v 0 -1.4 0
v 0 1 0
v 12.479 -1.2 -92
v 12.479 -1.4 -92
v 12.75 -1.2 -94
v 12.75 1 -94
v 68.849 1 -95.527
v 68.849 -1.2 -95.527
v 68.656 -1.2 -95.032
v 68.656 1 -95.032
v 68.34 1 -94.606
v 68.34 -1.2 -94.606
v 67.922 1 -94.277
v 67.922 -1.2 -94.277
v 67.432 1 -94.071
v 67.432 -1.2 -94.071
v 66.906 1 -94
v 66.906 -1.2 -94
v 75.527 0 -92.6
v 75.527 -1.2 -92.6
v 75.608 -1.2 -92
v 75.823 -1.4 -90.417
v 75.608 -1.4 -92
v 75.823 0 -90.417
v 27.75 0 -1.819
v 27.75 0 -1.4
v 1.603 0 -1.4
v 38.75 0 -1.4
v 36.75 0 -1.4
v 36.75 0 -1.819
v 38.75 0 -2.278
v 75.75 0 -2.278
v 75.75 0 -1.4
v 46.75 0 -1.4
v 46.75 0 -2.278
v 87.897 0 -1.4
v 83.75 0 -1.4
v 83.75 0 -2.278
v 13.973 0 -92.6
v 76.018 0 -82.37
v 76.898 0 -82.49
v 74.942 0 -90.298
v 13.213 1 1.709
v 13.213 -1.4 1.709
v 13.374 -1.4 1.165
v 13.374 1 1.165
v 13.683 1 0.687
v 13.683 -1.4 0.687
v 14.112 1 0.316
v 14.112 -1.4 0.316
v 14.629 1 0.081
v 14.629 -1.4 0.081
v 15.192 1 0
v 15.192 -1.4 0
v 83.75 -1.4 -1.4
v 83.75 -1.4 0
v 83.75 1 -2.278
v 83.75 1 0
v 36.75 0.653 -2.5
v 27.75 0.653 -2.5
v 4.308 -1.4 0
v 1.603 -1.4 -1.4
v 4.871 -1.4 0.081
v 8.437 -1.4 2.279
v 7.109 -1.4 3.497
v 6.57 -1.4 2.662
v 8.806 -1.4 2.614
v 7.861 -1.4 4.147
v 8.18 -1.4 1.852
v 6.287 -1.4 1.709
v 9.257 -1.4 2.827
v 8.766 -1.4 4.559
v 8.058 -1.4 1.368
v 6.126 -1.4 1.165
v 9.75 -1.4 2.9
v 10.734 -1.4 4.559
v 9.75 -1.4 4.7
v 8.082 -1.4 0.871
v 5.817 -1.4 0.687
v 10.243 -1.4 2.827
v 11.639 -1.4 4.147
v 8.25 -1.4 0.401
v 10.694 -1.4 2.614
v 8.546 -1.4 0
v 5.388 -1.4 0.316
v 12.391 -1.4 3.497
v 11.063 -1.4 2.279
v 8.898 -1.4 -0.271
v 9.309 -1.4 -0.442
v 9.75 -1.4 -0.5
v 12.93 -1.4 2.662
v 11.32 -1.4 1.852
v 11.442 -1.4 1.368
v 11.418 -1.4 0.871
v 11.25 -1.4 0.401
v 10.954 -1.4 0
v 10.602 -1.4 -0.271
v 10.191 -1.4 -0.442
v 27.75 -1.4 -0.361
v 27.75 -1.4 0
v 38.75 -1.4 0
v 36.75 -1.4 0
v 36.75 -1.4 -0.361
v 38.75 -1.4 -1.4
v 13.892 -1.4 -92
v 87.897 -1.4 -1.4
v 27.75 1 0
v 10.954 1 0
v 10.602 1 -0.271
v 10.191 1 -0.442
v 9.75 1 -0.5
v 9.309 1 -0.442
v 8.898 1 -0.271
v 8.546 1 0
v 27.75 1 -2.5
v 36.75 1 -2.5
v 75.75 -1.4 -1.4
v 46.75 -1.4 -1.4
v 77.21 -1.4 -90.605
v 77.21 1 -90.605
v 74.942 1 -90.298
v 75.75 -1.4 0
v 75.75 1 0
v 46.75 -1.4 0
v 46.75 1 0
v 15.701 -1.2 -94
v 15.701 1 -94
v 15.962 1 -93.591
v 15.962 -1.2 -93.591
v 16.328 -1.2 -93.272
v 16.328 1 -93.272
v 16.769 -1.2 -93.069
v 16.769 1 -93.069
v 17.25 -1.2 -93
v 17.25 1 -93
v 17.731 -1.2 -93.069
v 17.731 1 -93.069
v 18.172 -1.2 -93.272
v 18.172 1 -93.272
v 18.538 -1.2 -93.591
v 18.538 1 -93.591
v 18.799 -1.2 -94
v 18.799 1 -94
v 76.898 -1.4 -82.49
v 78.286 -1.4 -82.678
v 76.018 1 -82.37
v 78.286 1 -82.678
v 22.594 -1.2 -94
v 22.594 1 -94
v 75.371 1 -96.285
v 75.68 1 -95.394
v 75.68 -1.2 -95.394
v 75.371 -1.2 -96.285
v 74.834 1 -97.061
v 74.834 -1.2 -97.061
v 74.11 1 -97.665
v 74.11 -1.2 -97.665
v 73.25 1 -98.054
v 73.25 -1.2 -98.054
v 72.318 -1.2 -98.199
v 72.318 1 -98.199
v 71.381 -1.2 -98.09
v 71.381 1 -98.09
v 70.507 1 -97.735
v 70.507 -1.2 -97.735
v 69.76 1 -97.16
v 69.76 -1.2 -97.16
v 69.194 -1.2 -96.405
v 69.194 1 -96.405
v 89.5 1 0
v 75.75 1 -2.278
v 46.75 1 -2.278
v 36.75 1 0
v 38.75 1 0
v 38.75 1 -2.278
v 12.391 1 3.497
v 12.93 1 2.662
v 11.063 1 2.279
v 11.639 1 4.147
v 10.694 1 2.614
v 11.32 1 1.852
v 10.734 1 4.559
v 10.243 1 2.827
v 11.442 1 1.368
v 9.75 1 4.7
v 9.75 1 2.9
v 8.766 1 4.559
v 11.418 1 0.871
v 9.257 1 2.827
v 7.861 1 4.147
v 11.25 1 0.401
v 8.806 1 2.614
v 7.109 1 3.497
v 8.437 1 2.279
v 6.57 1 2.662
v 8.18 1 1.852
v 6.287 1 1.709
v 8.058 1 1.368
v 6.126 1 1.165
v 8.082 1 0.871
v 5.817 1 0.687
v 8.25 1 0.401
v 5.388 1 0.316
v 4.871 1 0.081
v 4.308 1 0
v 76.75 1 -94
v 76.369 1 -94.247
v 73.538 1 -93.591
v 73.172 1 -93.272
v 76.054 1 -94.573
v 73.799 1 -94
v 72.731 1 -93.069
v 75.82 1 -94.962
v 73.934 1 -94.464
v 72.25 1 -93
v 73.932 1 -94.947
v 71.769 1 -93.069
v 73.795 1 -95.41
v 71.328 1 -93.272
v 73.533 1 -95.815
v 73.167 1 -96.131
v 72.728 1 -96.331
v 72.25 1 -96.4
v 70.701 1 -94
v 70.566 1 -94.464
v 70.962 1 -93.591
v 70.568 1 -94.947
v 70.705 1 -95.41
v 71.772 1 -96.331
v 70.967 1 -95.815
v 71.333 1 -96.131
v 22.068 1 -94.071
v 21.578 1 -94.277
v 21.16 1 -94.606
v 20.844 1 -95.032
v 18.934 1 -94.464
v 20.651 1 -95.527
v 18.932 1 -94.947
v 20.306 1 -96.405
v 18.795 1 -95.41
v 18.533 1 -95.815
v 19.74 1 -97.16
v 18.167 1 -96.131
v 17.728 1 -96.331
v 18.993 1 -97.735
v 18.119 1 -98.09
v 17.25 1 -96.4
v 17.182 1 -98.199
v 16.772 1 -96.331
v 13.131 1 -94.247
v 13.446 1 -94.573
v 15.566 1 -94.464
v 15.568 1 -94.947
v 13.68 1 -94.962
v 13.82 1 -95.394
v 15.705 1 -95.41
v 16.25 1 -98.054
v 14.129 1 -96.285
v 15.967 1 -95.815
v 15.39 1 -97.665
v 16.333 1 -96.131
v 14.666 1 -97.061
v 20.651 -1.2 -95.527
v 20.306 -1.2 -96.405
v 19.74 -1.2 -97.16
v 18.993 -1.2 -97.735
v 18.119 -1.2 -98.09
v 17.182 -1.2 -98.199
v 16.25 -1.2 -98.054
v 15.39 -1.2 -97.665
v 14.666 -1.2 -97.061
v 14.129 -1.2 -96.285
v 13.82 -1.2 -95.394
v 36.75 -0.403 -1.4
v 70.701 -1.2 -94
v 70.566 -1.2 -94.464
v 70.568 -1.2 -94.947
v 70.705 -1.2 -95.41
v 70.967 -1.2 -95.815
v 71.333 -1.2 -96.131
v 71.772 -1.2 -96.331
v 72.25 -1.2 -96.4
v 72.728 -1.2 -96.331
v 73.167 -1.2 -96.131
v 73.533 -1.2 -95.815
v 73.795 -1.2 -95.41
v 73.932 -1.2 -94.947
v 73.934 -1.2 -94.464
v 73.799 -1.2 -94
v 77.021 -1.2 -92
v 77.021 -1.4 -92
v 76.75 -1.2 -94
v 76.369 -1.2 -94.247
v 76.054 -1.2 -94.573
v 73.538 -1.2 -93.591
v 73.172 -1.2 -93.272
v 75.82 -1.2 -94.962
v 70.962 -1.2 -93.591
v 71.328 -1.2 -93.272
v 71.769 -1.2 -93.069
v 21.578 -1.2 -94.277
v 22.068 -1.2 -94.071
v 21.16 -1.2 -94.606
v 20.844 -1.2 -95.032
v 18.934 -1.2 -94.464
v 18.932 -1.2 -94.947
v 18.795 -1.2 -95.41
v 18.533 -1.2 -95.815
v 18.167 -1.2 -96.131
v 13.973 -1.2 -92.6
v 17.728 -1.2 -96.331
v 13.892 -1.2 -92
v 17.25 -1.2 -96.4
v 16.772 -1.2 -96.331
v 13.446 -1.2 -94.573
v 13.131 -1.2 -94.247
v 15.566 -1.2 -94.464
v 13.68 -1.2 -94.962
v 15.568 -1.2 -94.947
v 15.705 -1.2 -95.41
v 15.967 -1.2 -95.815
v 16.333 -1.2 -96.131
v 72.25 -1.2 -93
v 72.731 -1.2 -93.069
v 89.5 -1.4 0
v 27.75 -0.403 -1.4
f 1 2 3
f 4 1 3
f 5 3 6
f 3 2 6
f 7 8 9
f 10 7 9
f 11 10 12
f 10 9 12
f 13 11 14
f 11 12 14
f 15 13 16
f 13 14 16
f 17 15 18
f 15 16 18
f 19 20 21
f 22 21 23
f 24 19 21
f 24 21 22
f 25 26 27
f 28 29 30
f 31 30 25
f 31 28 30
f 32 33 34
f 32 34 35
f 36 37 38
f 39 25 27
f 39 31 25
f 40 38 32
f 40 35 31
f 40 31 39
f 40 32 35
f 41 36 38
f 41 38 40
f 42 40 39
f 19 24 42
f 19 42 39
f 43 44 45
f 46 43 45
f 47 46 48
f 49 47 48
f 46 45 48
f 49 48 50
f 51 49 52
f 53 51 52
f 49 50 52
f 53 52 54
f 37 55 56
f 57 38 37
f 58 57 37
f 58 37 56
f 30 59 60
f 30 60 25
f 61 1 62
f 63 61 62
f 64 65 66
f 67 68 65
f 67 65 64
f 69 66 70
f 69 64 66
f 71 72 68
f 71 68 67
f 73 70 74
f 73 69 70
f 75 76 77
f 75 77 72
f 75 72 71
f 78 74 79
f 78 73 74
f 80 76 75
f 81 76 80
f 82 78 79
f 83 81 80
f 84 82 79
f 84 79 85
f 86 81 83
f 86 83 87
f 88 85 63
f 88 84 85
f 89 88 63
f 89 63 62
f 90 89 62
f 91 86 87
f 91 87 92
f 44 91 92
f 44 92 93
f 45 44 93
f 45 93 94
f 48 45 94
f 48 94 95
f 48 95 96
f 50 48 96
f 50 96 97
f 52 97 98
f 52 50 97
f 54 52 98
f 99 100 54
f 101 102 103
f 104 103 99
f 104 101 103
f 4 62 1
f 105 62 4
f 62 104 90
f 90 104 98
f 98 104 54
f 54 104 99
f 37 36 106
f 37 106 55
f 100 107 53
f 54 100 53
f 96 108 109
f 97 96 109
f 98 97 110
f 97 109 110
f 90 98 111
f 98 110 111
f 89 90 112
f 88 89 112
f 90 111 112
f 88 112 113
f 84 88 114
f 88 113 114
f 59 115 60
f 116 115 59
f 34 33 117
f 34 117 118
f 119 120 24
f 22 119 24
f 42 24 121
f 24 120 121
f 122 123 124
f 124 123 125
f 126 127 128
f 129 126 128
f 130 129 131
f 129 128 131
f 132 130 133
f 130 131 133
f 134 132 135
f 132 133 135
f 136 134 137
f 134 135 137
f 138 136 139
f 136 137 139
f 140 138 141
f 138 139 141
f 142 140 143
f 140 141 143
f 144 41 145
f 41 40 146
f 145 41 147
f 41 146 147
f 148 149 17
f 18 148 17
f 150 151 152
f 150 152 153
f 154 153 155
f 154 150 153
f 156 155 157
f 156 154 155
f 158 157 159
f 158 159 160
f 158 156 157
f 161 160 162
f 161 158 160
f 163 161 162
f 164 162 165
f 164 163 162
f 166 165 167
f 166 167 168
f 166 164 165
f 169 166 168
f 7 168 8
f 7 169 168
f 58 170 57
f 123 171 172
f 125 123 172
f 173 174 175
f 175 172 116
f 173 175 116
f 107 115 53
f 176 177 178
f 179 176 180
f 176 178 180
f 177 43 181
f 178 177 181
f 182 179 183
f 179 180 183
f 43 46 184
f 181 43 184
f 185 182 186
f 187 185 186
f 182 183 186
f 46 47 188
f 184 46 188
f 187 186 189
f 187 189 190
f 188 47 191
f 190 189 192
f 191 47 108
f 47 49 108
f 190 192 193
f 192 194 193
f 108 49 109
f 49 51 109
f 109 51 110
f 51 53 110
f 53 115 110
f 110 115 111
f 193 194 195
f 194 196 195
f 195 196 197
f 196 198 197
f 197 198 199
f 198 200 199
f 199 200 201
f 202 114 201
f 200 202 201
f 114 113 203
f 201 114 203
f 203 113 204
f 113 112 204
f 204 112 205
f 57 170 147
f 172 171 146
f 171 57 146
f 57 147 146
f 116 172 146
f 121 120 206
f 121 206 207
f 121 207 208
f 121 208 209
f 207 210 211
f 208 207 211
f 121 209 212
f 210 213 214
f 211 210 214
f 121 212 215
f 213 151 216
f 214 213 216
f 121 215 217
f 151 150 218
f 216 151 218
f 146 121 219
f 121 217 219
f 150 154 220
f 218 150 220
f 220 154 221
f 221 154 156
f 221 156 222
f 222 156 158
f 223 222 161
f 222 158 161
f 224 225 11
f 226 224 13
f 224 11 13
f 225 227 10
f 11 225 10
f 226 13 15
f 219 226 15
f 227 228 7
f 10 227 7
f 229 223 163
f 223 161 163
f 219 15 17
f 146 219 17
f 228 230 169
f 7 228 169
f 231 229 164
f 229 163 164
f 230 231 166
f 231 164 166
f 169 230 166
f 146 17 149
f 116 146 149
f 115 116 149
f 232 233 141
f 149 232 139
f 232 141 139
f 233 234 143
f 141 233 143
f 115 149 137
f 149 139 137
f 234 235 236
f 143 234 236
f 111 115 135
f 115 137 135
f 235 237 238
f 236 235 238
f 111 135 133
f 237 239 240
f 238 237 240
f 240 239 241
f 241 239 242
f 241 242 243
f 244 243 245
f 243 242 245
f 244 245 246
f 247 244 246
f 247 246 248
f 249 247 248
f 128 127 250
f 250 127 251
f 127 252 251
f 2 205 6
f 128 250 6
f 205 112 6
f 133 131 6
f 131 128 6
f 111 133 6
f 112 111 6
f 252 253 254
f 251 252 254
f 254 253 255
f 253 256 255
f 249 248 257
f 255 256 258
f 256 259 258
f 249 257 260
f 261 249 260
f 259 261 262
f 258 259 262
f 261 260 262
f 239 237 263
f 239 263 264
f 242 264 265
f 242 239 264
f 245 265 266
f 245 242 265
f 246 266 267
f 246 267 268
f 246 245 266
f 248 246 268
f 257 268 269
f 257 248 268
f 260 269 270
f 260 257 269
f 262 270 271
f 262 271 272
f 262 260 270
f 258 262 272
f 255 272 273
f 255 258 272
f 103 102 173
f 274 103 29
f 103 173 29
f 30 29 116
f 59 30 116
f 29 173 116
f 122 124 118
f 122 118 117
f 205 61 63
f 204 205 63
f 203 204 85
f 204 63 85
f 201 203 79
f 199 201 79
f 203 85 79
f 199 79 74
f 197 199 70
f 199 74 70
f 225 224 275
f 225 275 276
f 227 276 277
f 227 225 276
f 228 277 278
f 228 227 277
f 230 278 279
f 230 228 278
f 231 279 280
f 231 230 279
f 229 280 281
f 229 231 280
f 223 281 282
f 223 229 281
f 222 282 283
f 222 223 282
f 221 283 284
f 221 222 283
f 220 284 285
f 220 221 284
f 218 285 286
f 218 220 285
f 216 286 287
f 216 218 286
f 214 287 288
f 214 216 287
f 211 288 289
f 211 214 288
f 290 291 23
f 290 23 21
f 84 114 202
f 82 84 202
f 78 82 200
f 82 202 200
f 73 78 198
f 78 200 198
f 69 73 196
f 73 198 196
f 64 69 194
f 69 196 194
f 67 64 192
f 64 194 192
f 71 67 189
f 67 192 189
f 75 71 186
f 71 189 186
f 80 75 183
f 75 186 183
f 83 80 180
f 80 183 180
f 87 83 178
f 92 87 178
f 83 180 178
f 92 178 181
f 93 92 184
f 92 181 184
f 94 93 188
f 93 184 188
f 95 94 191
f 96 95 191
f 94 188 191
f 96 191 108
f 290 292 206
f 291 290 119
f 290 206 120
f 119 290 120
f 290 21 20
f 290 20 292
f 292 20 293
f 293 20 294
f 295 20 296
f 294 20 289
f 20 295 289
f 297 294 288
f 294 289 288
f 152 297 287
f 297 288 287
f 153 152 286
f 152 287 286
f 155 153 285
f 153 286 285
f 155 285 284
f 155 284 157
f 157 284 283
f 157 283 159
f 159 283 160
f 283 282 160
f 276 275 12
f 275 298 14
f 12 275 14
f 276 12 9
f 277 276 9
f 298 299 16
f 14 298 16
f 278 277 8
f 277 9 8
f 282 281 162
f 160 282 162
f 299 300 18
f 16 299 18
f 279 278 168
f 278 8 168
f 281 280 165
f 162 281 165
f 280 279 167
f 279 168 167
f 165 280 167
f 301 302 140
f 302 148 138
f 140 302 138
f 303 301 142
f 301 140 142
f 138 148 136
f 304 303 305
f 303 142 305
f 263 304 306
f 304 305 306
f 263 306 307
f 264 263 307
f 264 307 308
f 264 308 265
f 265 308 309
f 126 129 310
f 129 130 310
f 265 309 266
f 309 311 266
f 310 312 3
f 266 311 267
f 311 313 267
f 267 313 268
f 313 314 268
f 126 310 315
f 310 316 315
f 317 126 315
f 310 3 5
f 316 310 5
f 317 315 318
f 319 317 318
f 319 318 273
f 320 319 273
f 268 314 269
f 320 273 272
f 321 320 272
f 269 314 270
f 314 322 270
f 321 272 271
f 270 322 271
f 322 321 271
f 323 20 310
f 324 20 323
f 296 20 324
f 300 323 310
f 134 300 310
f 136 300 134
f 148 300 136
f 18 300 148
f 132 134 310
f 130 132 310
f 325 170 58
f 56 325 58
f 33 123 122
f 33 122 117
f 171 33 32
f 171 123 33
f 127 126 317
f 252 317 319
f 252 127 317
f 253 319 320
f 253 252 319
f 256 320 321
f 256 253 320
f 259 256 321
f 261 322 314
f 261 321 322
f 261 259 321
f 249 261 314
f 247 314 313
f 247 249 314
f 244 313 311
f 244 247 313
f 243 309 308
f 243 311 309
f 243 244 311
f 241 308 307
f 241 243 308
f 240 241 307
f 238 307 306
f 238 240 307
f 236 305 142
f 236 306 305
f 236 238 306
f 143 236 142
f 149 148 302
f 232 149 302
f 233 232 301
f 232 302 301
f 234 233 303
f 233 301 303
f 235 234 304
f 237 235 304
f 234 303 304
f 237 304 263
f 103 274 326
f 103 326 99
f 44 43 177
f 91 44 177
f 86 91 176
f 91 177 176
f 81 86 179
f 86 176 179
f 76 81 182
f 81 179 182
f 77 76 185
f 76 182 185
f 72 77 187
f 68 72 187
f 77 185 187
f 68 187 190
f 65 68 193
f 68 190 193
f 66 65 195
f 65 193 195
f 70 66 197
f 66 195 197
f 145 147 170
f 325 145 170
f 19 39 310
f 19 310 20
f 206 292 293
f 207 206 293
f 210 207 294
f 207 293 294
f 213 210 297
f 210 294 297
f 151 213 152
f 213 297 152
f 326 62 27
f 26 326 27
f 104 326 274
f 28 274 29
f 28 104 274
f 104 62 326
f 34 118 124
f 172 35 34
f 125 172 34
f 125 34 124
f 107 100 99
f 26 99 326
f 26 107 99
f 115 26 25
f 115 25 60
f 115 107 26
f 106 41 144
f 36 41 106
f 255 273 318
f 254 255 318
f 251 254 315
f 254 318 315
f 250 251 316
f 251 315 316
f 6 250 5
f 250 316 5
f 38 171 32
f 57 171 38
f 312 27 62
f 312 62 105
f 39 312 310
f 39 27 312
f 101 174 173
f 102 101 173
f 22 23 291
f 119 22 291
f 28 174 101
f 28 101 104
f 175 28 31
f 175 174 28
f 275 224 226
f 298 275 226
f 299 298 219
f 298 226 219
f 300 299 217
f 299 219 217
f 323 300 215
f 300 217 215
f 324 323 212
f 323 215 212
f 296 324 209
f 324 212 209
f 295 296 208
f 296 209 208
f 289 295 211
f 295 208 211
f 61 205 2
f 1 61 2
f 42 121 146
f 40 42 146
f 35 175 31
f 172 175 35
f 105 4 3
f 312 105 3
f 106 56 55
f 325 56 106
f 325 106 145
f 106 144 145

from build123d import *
from build123d.topology import SkipClean

# Parameters (mm, degrees)
EXTRUDE_1_DEPTH     = 1
EXTRUDE_2_DEPTH     = 1.4
EXTRUDE_3_DEPTH     = 2.4
CUT_EXTRUDE_2_REACH = 134.888
SKETCH_4_R          = 1.7
CUT_EXTRUDE_3_DEPTH = 10
CUT_EXTRUDE_4_REACH = 134.874
SKETCH_6_W          = 6.2
SKETCH_6_H          = 0.2
FILLET_START        = -1.2
FILLET_1_DEPTH      = 2.2
FILLET_START_2      = -1.4
FILLET_1_2_DEPTH    = 0.226512
SKETCH_7_W          = 9
SKETCH_7_H          = 2.5
CUT_EXTRUDE_5_DEPTH = 133.88811083
EXTRUDE_4_REACH     = 113.48


with BuildPart() as part:
    # 草图1 → 凸台-拉伸1 (new body)
    with BuildSketch(Plane(origin=(0, 0, 0), x_dir=(1, 0, 0), z_dir=(0, 1, 0))):
        Polygon((0, 0), (12.75, 94), (76.75, 94), (89.5, 0), align=None)
    extrude(amount=EXTRUDE_1_DEPTH)

    # 草图2 → 凸台-拉伸2 (add)
    with BuildSketch(Plane.XZ):
        Polygon((89.5, 0), (0, 0), (12.75, -94), (76.75, -94), align=None)
        Polygon((87.897286654, -1.4), (1.602713346, -1.4), (13.972926112, -92.6), (75.527073888, -92.6), align=None, mode=Mode.SUBTRACT)
    extrude(amount=EXTRUDE_2_DEPTH)

    # 草图3 → 凸台-拉伸3 (add)
    with BuildSketch(Plane(origin=(0, 1, 0), x_dir=(1, 0, 0), z_dir=(0, 1, 0))):
        with BuildLine():
            Line((6.25, -1.2), (6.25, 0))
            Line((6.25, 0), (8.545840542, 0))
            ThreePointArc((8.545840542, 0), (9.75, -2.9), (10.954159458, 0))
            Line((10.954159458, 0), (13.25, 0))
            Line((13.25, 0), (13.25, -1.2))
            ThreePointArc((13.25, -1.2), (9.75, -4.7), (6.25, -1.2))
        make_face()
        with BuildLine():
            Line((13.75, 94.7), (13.75, 94))
            Line((13.75, 94), (13.82071436, 94))
            Line((13.82071436, 94), (15.700806662, 94))
            ThreePointArc((15.700806662, 94), (17.25, 96.4), (18.799193338, 94))
            Line((18.799193338, 94), (20.75, 94))
            Line((20.75, 94), (20.75, 94.7))
            ThreePointArc((20.75, 94.7), (17.25, 98.2), (13.75, 94.7))
        make_face()
        with BuildLine():
            Line((68.75, 94.7), (68.75, 94))
            Line((68.75, 94), (70.700806662, 94))
            ThreePointArc((70.700806662, 94), (72.25, 96.4), (73.799193338, 94))
            Line((73.799193338, 94), (75.75, 94))
            Line((75.75, 94), (75.75, 94.7))
            ThreePointArc((75.75, 94.7), (72.25, 98.2), (68.75, 94.7))
        make_face()
    extrude(amount=-EXTRUDE_3_DEPTH)

    # 草图4 → 切除-拉伸2 (cut, up to next)
    with BuildSketch(Plane(origin=(0, 1, 0), x_dir=(1, 0, 0), z_dir=(0, 1, 0)), mode=Mode.PRIVATE) as cut_extrude_2_sk1:
        with Locations(Location((9.75, -1.2, 0), (0, 0, 270))):
            Circle(SKETCH_4_R)
    cut_extrude_2_tool1 = extrude(cut_extrude_2_sk1.sketch, amount=-CUT_EXTRUDE_2_REACH, mode=Mode.PRIVATE) & part.part
    # 草图4 → 切除-拉伸2 (cut, up to next)
    with BuildSketch(Plane(origin=(0, 1, 0), x_dir=(1, 0, 0), z_dir=(0, 1, 0)), mode=Mode.PRIVATE) as cut_extrude_2_sk2:
        with Locations(Location((17.25, 94.7, 0), (0, 0, 270))):
            Circle(SKETCH_4_R)
    cut_extrude_2_tool2 = extrude(cut_extrude_2_sk2.sketch, amount=-CUT_EXTRUDE_2_REACH, mode=Mode.PRIVATE) & part.part
    # 草图4 → 切除-拉伸2 (cut, up to next)
    with BuildSketch(Plane(origin=(0, 1, 0), x_dir=(1, 0, 0), z_dir=(0, 1, 0)), mode=Mode.PRIVATE) as cut_extrude_2_sk3:
        with Locations(Location((72.25, 94.7, 0), (0, 0, 270))):
            Circle(SKETCH_4_R)
    cut_extrude_2_tool3 = extrude(cut_extrude_2_sk3.sketch, amount=-CUT_EXTRUDE_2_REACH, mode=Mode.PRIVATE) & part.part
    add(cut_extrude_2_tool1.solids().sort_by_distance((9.75, 1, 1.2))[0], mode=Mode.SUBTRACT)
    add(cut_extrude_2_tool2.solids().sort_by_distance((17.25, 1, -94.7))[0], mode=Mode.SUBTRACT)
    add(cut_extrude_2_tool3.solids().sort_by_distance((72.25, 1, -94.7))[0], mode=Mode.SUBTRACT)

    # 草图5 → 切除-拉伸3 (cut)
    with SkipClean():  # the faces are left unmerged after this step: merging them gives an invalid solid
        with BuildSketch(Plane(origin=(0, 1, 0), x_dir=(1, 0, 0), z_dir=(0, 1, 0))):
            with BuildLine():
                Line((78.21236986, 90.741242548), (74.942313599, 90.297697683))
                Line((74.942313599, 90.297697683), (76.017573878, 82.370288564))
                Line((76.017573878, 82.370288564), (79.28763014, 82.81383343))
                ThreePointArc((79.28763014, 82.81383343), (82.713704559, 87.315168128), (78.21236986, 90.741242548))
            make_face()
            with BuildLine():
                Line((38.75, -1.222462011), (38.75, 2.277537989))
                Line((38.75, 2.277537989), (46.75, 2.277537989))
                Line((46.75, 2.277537989), (46.75, -1.222462011))
                ThreePointArc((46.75, -1.222462011), (42.75, -5.222462011), (38.75, -1.222462011))
            make_face()
            with BuildLine():
                Line((75.75, -1.222462011), (75.75, 2.277537989))
                Line((75.75, 2.277537989), (83.75, 2.277537989))
                Line((83.75, 2.277537989), (83.75, -1.222462011))
                ThreePointArc((83.75, -1.222462011), (79.75, -5.222462011), (75.75, -1.222462011))
            make_face()
        extrude(amount=-CUT_EXTRUDE_3_DEPTH, mode=Mode.SUBTRACT)

    # 草图6 → 切除-拉伸4 (cut, up to next)
    with BuildSketch(Plane(origin=(0, 0, 0), x_dir=(0, 0, -1), z_dir=(1, 0, 0)), mode=Mode.PRIVATE) as cut_extrude_4_sk1:
        with Locations((95.1, -1.3)):
            Rectangle(SKETCH_6_W, SKETCH_6_H)
    cut_extrude_4_tool1 = extrude(cut_extrude_4_sk1.sketch, amount=CUT_EXTRUDE_4_REACH, mode=Mode.PRIVATE) & part.part
    add(cut_extrude_4_tool1.solids().sort_by_distance((0, -1.3, -95.1))[0], mode=Mode.SUBTRACT)

    # 圆角1: read off the stored shape, not the designer's step
    # 圆角1 outline → 圆角1 (add)
    with SkipClean():  # the faces are left unmerged after this step: merging them gives an invalid solid
        with BuildSketch(Plane(origin=(0, 0, 0), x_dir=(1, 0, 0), z_dir=(0, 1, 0)).offset(FILLET_START)):
            with BuildLine():
                ThreePointArc((13.25, -1.2), (13.240681915, -1.455224942), (13.212777274, -1.709090909))
                ThreePointArc((13.212777274, -1.709090909), (13.884185107, -0.486425063), (15.191507144, 0))
                Line((15.191507144, 0), (13.25, 0))
                Line((13.25, 0), (13.25, -1.2))
            make_face()
            with BuildLine():
                ThreePointArc((4.308492856, 0), (5.615814893, -0.486425063), (6.287222726, -1.709090909))
                ThreePointArc((6.287222726, -1.709090909), (6.259318085, -1.455224942), (6.25, -1.2))
                Line((6.25, -1.2), (6.25, 0))
                Line((6.25, 0), (4.308492856, 0))
            make_face()
            with BuildLine():
                Line((75.75, 94), (76.75, 94))
                ThreePointArc((76.75, 94), (76.053957158, 94.573295448), (75.680491288, 95.394067374))
                ThreePointArc((75.680491288, 95.394067374), (75.732579469, 95.048769616), (75.75, 94.7))
                Line((75.75, 94.7), (75.75, 94))
            make_face()
            with BuildLine():
                ThreePointArc((13.75, 94.7), (13.767420531, 95.048769616), (13.819508712, 95.394067374))
                ThreePointArc((13.819508712, 95.394067374), (13.446042842, 94.573295448), (12.75, 94))
                Line((12.75, 94), (13.75, 94))
                Line((13.75, 94), (13.75, 94.7))
            make_face()
            with BuildLine():
                Line((20.75, 94), (22.594155686, 94))
                ThreePointArc((22.594155686, 94), (21.358326925, 94.427509214), (20.650826346, 95.527272727))
                ThreePointArc((20.650826346, 95.527272727), (20.725118143, 95.116598001), (20.75, 94.7))
                Line((20.75, 94.7), (20.75, 94))
            make_face()
            with BuildLine():
                ThreePointArc((68.75, 94.7), (68.774881857, 95.116598001), (68.849173654, 95.527272727))
                ThreePointArc((68.849173654, 95.527272727), (68.141673075, 94.427509214), (66.905844314, 94))
                Line((66.905844314, 94), (68.75, 94))
                Line((68.75, 94), (68.75, 94.7))
            make_face()
        extrude(amount=FILLET_1_DEPTH)

    # Fillet 1 2 outline → Fillet 1 2 (add)
    with SkipClean():  # the faces are left unmerged after this step: merging them gives an invalid solid
        with BuildSketch(Plane(origin=(0, 0, 0), x_dir=(1, 0, 0), z_dir=(0, 1, 0)).offset(FILLET_START_2)):
            with BuildLine():
                ThreePointArc((13.25, -1.2), (13.240681915, -1.455224942), (13.212777274, -1.709090909))
                ThreePointArc((13.212777274, -1.709090909), (13.884185107, -0.486425063), (15.191507144, 0))
                Line((15.191507144, 0), (13.25, 0))
                Line((13.25, 0), (13.25, -1.2))
            make_face()
            with BuildLine():
                ThreePointArc((4.308492856, 0), (5.615814893, -0.486425063), (6.287222726, -1.709090909))
                ThreePointArc((6.287222726, -1.709090909), (6.259318085, -1.455224942), (6.25, -1.2))
                Line((6.25, -1.2), (6.25, 0))
                Line((6.25, 0), (4.308492856, 0))
            make_face()
        extrude(amount=FILLET_1_2_DEPTH)

    # 草图7 → 切除-拉伸5 (cut, through all)
    with SkipClean():  # the faces are left unmerged after this step: merging them gives an invalid solid
        with BuildSketch(Plane(origin=(0, 1, 0), x_dir=(1, 0, 0), z_dir=(0, 1, 0))):
            with Locations((32.25, 1.25)):
                Rectangle(SKETCH_7_W, SKETCH_7_H)
        extrude(amount=-CUT_EXTRUDE_5_DEPTH, mode=Mode.SUBTRACT)

    # 草图8 → 凸台-拉伸4 (add, up to next)
    with BuildSketch(Plane.ZY.offset(-36.75), mode=Mode.PRIVATE) as extrude_4_sk1:
        Polygon((-2.5, 0.653445531), (-1.819327572, 0), (-2.5, 0), align=None)
    extrude_4_tool1 = extrude(extrude_4_sk1.sketch, amount=EXTRUDE_4_REACH, mode=Mode.PRIVATE) - part.part
    # 草图8 → 凸台-拉伸4 (add, up to next)
    with BuildSketch(Plane.ZY.offset(-36.75), mode=Mode.PRIVATE) as extrude_4_sk2:
        Polygon((-0.360994239, -1.4), (-1.4, -1.4), (-1.4, -0.402554469), align=None)
    extrude_4_tool2 = extrude(extrude_4_sk2.sketch, amount=EXTRUDE_4_REACH, mode=Mode.PRIVATE) - part.part
    add(extrude_4_tool1.solids().sort_by_distance((36.75, 0.217815, -2.273109))[0])
    add(extrude_4_tool2.solids().sort_by_distance((36.75, -1.067518, -1.053665))[0])


solid = part.part
